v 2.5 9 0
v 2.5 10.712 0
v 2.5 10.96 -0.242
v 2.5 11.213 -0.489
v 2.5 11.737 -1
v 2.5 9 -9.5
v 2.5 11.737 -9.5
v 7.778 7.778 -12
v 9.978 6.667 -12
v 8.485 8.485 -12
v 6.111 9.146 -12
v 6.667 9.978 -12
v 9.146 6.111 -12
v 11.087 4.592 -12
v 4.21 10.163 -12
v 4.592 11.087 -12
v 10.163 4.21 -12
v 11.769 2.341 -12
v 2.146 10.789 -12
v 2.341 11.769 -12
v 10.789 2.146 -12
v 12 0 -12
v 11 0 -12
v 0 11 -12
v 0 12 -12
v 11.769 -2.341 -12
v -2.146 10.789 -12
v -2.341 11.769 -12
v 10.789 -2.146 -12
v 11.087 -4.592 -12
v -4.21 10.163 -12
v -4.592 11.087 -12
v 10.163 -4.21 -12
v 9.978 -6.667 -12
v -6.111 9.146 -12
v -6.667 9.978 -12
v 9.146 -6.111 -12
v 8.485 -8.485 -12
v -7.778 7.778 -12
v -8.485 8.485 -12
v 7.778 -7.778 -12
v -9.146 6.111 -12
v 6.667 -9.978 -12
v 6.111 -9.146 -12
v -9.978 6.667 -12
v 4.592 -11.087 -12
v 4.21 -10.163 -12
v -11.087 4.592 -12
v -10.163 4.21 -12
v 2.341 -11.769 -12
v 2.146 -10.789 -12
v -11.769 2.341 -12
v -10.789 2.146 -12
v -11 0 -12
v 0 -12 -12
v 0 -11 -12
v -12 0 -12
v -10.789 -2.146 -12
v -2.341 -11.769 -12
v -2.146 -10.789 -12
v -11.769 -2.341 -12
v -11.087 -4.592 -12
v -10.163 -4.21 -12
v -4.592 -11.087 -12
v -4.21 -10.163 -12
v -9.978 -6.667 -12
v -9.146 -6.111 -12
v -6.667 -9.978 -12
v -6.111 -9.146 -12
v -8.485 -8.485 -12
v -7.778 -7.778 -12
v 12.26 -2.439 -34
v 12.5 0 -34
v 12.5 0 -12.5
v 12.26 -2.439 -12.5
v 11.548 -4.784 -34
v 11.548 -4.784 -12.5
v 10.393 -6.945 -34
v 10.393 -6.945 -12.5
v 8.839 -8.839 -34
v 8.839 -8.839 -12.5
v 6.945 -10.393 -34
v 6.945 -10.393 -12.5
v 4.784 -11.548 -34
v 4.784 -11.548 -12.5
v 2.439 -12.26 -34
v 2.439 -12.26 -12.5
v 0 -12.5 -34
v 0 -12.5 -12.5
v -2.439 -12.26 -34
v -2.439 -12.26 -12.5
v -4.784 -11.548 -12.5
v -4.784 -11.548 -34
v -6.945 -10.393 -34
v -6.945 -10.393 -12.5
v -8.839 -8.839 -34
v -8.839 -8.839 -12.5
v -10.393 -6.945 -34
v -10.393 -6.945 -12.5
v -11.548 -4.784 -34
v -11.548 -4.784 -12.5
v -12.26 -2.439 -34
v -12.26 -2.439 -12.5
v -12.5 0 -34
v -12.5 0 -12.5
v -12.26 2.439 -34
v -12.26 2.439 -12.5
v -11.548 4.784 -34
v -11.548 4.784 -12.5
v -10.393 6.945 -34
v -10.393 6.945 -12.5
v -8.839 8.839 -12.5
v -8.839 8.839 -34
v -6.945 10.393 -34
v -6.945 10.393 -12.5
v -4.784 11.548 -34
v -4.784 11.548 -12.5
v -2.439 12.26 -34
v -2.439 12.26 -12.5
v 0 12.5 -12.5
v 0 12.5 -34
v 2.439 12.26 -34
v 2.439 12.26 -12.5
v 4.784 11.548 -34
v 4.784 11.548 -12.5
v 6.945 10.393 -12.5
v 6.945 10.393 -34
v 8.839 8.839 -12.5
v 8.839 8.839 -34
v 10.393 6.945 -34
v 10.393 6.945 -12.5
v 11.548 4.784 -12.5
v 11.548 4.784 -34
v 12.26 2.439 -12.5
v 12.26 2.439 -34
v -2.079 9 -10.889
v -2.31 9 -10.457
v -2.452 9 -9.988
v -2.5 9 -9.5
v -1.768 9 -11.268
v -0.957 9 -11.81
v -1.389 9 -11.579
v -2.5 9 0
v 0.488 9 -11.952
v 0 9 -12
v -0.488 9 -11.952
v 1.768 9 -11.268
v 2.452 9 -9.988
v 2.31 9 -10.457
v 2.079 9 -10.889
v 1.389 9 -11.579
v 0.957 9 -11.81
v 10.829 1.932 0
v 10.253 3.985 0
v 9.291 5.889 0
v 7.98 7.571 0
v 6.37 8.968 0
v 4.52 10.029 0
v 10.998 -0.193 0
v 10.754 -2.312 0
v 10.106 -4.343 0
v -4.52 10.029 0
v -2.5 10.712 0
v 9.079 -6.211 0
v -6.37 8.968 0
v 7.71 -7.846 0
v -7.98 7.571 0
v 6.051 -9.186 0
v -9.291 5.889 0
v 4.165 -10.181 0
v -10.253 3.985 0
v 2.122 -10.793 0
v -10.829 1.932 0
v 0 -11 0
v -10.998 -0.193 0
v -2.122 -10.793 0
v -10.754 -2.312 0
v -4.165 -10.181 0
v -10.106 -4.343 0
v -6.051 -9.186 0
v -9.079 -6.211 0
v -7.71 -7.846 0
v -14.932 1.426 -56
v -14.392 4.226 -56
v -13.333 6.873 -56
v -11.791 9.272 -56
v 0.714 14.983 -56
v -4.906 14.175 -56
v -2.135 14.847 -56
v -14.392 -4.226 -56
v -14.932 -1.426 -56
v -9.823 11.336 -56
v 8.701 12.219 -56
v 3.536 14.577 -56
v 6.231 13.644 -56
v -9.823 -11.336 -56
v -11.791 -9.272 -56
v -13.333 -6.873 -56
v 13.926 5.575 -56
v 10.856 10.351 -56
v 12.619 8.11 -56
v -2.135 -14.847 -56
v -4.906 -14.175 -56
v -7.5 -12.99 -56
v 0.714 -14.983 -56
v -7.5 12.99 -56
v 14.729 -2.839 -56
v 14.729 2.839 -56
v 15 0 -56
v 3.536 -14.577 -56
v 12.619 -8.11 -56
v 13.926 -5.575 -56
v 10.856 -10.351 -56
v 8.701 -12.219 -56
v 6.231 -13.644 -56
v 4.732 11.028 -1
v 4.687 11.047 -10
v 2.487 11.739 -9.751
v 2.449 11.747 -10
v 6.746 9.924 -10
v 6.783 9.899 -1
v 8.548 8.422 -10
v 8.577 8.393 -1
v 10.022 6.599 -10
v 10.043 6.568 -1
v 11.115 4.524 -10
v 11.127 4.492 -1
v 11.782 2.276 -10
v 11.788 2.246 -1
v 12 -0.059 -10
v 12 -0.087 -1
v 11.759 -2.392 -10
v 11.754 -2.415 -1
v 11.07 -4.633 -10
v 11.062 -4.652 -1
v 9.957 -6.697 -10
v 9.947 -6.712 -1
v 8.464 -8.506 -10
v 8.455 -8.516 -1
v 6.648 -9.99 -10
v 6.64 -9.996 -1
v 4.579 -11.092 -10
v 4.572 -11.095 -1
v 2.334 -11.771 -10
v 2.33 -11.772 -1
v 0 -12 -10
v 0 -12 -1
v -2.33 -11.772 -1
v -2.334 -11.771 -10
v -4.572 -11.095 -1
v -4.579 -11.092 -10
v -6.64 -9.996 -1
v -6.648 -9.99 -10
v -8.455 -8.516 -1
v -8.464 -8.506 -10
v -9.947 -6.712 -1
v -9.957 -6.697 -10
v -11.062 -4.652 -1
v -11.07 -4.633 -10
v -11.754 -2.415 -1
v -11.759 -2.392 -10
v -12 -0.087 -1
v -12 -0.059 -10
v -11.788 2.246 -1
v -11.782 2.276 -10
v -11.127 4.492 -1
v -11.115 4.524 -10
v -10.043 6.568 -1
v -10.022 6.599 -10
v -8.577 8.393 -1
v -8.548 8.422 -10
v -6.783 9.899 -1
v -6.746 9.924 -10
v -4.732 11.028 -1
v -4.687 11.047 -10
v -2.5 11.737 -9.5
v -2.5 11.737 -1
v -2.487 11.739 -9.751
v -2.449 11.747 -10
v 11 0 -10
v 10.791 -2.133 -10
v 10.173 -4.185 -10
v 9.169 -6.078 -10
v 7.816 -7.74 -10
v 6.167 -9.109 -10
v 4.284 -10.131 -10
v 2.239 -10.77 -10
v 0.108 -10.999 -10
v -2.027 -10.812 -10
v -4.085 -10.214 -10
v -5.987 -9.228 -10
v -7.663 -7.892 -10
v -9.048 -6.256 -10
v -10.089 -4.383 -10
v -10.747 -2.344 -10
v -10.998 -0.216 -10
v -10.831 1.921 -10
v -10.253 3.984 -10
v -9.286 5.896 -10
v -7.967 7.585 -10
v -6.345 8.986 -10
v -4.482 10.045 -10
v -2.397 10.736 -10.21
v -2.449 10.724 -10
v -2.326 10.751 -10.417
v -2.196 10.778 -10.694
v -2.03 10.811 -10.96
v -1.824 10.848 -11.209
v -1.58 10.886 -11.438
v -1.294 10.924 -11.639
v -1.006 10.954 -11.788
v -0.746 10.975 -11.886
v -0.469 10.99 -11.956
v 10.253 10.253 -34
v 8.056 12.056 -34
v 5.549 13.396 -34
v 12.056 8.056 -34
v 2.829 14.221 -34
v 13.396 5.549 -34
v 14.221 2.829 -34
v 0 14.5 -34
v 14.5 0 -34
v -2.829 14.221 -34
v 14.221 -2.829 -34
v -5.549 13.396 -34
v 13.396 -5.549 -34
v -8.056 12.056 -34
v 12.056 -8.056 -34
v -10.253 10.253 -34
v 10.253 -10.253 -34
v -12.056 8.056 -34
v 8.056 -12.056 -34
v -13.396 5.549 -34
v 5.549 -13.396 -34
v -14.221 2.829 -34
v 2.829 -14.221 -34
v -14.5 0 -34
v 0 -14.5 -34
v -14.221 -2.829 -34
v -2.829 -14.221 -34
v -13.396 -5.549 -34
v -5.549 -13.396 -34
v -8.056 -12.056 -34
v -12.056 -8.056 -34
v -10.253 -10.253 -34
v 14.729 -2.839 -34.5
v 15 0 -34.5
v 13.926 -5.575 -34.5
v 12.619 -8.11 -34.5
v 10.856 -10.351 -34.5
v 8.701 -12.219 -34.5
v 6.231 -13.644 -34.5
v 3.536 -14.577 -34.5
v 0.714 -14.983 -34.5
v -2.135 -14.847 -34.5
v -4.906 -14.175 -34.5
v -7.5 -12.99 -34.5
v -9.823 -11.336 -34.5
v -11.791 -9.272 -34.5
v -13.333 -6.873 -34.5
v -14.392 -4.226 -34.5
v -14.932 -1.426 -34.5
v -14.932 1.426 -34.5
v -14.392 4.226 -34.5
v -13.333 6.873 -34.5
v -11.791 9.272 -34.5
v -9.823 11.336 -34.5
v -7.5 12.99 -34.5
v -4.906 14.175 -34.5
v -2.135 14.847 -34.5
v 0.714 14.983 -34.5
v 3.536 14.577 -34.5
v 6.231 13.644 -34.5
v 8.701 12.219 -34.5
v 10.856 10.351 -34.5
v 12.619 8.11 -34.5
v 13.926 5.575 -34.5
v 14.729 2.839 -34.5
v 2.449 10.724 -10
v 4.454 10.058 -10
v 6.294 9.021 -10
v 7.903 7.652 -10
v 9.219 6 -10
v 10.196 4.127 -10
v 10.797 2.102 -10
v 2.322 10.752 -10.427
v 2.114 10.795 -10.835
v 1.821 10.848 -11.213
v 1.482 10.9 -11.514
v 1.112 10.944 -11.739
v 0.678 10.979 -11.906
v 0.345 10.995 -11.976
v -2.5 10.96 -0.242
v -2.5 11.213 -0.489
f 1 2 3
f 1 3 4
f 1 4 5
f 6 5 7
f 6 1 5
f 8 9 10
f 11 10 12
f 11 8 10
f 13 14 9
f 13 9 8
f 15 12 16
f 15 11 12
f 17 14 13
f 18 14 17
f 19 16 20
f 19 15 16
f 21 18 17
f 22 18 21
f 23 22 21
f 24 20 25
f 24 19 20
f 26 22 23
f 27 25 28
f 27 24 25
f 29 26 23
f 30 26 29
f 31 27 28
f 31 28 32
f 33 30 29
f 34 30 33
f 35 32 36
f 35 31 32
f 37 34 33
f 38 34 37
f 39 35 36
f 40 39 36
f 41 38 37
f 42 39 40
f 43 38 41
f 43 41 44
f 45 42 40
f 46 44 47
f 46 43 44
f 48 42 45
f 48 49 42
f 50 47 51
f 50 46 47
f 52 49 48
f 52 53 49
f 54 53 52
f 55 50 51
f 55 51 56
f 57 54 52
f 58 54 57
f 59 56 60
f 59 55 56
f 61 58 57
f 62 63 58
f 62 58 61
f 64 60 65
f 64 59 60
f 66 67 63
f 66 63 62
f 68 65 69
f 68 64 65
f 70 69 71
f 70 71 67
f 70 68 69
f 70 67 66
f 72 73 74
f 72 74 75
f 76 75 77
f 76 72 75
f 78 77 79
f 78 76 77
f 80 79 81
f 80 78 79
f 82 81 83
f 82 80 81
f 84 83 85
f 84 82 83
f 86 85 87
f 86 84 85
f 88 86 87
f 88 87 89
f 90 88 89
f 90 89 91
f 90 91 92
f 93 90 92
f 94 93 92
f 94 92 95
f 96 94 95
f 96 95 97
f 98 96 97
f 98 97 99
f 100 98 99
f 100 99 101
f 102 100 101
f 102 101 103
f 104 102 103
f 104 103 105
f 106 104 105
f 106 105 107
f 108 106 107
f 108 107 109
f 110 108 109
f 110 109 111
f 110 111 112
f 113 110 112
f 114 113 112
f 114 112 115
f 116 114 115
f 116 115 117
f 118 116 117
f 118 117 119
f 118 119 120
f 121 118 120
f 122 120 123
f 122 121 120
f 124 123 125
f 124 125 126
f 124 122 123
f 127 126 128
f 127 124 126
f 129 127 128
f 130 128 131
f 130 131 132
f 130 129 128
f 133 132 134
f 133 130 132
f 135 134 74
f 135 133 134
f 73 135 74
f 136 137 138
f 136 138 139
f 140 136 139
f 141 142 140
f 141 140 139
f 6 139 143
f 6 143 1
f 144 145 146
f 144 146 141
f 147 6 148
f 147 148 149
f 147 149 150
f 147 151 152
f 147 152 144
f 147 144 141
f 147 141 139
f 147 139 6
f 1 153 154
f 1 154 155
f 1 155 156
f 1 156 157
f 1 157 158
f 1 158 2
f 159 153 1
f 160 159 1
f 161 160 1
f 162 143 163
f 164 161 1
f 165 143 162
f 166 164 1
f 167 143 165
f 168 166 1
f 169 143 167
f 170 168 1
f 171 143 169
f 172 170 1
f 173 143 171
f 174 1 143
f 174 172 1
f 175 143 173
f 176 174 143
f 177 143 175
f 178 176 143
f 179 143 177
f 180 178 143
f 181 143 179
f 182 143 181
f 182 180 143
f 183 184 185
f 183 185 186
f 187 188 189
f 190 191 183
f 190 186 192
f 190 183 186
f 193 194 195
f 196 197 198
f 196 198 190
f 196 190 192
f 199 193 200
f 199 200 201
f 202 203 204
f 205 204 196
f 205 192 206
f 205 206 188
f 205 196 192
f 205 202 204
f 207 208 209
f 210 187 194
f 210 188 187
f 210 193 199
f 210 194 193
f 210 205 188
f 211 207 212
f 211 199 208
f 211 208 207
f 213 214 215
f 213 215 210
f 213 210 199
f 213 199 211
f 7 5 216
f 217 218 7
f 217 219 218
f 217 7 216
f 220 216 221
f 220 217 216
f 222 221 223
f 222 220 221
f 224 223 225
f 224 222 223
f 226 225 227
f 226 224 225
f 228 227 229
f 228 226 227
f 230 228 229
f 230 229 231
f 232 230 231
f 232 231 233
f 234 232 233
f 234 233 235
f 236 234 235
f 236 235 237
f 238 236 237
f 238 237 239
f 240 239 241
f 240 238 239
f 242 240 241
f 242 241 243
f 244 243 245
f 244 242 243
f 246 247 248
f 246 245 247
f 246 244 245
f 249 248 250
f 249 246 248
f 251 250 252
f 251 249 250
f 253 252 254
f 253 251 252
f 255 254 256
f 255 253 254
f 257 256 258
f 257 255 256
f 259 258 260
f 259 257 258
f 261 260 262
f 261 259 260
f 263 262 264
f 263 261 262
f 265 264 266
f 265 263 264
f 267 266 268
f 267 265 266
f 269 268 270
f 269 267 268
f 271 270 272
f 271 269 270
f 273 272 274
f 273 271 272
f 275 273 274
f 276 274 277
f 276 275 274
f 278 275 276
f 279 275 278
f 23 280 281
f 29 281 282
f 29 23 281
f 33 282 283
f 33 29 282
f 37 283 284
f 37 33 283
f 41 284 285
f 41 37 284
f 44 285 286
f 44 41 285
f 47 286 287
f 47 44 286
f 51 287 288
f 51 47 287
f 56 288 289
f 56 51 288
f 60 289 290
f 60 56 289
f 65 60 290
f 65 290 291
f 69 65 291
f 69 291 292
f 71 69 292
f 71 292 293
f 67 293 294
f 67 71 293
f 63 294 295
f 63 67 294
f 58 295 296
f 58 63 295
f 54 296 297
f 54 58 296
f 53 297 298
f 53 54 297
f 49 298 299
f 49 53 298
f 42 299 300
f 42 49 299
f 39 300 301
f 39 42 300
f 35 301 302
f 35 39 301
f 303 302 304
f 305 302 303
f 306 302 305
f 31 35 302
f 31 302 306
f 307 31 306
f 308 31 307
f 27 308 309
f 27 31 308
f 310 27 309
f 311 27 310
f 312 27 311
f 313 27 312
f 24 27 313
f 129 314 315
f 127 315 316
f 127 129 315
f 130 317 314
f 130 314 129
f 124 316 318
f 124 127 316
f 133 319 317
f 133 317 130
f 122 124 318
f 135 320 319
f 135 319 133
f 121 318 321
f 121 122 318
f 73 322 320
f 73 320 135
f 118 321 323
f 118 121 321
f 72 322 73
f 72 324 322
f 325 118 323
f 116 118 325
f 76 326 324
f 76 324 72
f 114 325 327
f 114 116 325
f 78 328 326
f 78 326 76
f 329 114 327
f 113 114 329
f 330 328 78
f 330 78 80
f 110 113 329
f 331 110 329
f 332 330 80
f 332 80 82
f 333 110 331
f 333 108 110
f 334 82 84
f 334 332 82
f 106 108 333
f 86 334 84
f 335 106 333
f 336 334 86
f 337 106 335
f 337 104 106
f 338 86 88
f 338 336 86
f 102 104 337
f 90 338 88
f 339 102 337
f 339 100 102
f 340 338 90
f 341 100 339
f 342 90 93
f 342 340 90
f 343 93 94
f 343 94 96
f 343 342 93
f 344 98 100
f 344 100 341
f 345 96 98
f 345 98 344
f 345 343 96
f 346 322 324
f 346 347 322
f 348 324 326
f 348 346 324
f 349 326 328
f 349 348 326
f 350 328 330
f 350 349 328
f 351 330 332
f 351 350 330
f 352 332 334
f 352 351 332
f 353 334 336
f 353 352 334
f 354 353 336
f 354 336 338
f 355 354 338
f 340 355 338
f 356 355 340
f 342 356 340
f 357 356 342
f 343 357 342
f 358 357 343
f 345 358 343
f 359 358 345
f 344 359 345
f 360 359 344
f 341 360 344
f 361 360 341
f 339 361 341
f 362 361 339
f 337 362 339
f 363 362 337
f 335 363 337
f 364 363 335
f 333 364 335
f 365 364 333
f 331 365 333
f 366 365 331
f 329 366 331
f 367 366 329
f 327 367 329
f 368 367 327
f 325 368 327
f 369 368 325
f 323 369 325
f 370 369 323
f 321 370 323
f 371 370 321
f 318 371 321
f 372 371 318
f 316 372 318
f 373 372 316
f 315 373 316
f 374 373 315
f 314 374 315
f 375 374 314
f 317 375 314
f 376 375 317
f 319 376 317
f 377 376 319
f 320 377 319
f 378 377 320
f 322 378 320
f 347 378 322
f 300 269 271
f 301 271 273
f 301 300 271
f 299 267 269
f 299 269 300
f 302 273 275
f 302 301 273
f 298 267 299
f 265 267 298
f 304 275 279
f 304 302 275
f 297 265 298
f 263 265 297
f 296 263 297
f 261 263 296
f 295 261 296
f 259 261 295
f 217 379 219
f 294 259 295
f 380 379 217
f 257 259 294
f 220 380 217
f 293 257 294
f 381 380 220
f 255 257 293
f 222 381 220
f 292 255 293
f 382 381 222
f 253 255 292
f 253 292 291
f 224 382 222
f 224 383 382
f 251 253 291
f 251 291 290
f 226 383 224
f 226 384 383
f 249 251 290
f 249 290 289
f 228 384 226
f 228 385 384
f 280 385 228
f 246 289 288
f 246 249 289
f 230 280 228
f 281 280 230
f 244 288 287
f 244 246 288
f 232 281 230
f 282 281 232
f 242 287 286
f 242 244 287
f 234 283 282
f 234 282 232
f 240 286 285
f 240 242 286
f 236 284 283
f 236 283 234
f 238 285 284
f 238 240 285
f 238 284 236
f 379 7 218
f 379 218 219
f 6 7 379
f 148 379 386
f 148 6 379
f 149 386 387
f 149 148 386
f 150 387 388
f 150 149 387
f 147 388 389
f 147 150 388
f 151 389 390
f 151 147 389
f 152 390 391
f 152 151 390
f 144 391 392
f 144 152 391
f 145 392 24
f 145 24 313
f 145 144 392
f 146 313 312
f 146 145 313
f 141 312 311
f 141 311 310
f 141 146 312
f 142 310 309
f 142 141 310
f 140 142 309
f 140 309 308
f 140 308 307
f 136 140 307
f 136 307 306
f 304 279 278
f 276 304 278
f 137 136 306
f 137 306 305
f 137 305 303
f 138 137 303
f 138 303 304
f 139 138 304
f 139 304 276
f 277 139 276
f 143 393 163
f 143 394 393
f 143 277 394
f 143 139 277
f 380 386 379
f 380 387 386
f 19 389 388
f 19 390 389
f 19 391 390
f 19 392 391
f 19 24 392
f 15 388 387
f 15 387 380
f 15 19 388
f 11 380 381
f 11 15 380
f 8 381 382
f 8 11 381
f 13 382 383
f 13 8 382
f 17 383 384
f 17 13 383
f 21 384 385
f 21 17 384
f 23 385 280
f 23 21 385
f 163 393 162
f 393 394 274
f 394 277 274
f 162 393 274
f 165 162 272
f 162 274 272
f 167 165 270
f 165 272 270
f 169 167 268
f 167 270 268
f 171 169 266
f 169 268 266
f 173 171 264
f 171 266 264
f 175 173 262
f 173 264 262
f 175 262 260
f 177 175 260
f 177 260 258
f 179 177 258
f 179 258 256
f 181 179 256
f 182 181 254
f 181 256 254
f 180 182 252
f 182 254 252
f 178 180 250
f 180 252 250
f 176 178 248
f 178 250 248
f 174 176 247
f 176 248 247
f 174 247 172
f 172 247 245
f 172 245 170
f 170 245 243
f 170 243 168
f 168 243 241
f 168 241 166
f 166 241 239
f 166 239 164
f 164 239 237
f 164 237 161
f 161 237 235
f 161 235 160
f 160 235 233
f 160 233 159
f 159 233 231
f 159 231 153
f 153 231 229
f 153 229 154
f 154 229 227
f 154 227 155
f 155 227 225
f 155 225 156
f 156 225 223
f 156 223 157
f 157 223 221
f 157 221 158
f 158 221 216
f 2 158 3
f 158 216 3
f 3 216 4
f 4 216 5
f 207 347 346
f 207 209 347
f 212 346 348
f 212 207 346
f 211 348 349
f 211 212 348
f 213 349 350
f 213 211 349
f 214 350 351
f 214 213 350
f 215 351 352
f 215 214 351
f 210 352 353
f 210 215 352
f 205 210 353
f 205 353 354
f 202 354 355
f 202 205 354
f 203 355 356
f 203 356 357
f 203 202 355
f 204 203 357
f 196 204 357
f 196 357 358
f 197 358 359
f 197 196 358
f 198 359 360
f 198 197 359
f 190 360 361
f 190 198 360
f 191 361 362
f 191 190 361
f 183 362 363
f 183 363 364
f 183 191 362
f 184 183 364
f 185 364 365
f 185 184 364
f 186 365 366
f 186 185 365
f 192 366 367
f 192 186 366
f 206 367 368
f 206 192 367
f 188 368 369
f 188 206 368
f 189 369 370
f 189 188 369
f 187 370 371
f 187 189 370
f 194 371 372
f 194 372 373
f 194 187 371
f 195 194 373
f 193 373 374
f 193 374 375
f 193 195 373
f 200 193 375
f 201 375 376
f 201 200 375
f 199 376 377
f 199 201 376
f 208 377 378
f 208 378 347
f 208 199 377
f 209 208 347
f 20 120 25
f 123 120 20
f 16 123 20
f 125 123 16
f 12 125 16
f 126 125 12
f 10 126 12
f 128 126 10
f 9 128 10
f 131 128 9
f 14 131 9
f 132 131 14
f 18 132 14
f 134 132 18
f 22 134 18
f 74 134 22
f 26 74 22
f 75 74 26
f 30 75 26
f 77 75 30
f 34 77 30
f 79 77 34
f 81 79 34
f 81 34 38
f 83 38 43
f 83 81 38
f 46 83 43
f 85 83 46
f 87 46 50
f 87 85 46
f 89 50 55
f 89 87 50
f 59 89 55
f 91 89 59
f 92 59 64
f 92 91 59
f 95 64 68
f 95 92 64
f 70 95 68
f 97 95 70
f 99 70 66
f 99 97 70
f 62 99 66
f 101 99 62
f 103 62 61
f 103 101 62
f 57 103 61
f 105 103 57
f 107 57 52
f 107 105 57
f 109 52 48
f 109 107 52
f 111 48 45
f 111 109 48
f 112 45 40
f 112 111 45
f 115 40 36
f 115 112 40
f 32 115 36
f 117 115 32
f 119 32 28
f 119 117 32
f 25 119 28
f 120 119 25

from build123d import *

# Parameters (mm, degrees)
CUT_EXTRUDE_1_DEPTH = 63.745517768
CHAMFER_1_SIZE      = 1
CHAMFER_2_SIZE      = 0.5


with BuildPart() as part:
    # 草图1 → 旋转1 (revolve)
    with BuildSketch(Plane(origin=(0, 0, 0), x_dir=(0, 0, -1), z_dir=(1, 0, 0)), mode=Mode.PRIVATE) as revolve_1_sk:
        Polygon((0, 0), (0, 12), (10, 12), (10, 11), (12, 11), (12, 12.5), (34, 12.5), (34, 15), (56, 15), (56, 0), align=None)
    revolve(revolve_1_sk.sketch.rotate(Axis((0, 0, 0), (0, 0, -1)), 90), axis=Axis((0, 0, 0), (0, 0, -1)))

    # 草图2 → 切除-拉伸1 (cut, through all)
    with BuildSketch(Plane(origin=(0, 9, 0), x_dir=(1, 0, 0), z_dir=(0, 1, 0))):
        with BuildLine():
            Line((-2.5, 9.5), (-2.5, 0))
            Line((-2.5, 0), (2.5, 0))
            Line((2.5, 0), (2.5, 9.5))
            ThreePointArc((2.5, 9.5), (0, 12), (-2.5, 9.5))
        make_face()
    extrude(amount=CUT_EXTRUDE_1_DEPTH, mode=Mode.SUBTRACT)

    # 倒角1
    chamfer_1_edges = [part.edges().sort_by_distance(p)[0] for p in [
        (0, -12, 0),
    ]]
    chamfer(chamfer_1_edges, length=CHAMFER_1_SIZE)

    # 倒角2
    # the kernel refuses this chamfer: 0.5 mm, written as the material it takes off along each edge
    with BuildSketch(Plane(origin=(0, 0, -34), x_dir=(1, 0, 0), z_dir=(0, 1, 0))) as chamfer_2_piece_1:
        Polygon((15 - CHAMFER_2_SIZE, 0), (15, CHAMFER_2_SIZE), (15, 0), align=None)
    revolve(axis=Axis((0, 0, -34), (0, 0, -1)), mode=Mode.SUBTRACT)
    with BuildSketch(Plane(origin=(0, 0, -12), x_dir=(0, 1, 0), z_dir=(-1, 0, 0))) as chamfer_2_piece_2:
        Polygon((12.5 - CHAMFER_2_SIZE, 0), (12.5, CHAMFER_2_SIZE), (12.5, 0), align=None)
    revolve(axis=Axis((0, 0, -12), (0, 0, -1)), revolution_arc=90, mode=Mode.SUBTRACT)
    with BuildSketch(Plane(origin=(0, 0, -12), x_dir=(1, 0, 0), z_dir=(0, 1, 0))) as chamfer_2_piece_3:
        Polygon((12.5 - CHAMFER_2_SIZE, 0), (12.5, CHAMFER_2_SIZE), (12.5, 0), align=None)
    revolve(axis=Axis((0, 0, -12), (0, 0, -1)), revolution_arc=270, mode=Mode.SUBTRACT)


solid = part.part
